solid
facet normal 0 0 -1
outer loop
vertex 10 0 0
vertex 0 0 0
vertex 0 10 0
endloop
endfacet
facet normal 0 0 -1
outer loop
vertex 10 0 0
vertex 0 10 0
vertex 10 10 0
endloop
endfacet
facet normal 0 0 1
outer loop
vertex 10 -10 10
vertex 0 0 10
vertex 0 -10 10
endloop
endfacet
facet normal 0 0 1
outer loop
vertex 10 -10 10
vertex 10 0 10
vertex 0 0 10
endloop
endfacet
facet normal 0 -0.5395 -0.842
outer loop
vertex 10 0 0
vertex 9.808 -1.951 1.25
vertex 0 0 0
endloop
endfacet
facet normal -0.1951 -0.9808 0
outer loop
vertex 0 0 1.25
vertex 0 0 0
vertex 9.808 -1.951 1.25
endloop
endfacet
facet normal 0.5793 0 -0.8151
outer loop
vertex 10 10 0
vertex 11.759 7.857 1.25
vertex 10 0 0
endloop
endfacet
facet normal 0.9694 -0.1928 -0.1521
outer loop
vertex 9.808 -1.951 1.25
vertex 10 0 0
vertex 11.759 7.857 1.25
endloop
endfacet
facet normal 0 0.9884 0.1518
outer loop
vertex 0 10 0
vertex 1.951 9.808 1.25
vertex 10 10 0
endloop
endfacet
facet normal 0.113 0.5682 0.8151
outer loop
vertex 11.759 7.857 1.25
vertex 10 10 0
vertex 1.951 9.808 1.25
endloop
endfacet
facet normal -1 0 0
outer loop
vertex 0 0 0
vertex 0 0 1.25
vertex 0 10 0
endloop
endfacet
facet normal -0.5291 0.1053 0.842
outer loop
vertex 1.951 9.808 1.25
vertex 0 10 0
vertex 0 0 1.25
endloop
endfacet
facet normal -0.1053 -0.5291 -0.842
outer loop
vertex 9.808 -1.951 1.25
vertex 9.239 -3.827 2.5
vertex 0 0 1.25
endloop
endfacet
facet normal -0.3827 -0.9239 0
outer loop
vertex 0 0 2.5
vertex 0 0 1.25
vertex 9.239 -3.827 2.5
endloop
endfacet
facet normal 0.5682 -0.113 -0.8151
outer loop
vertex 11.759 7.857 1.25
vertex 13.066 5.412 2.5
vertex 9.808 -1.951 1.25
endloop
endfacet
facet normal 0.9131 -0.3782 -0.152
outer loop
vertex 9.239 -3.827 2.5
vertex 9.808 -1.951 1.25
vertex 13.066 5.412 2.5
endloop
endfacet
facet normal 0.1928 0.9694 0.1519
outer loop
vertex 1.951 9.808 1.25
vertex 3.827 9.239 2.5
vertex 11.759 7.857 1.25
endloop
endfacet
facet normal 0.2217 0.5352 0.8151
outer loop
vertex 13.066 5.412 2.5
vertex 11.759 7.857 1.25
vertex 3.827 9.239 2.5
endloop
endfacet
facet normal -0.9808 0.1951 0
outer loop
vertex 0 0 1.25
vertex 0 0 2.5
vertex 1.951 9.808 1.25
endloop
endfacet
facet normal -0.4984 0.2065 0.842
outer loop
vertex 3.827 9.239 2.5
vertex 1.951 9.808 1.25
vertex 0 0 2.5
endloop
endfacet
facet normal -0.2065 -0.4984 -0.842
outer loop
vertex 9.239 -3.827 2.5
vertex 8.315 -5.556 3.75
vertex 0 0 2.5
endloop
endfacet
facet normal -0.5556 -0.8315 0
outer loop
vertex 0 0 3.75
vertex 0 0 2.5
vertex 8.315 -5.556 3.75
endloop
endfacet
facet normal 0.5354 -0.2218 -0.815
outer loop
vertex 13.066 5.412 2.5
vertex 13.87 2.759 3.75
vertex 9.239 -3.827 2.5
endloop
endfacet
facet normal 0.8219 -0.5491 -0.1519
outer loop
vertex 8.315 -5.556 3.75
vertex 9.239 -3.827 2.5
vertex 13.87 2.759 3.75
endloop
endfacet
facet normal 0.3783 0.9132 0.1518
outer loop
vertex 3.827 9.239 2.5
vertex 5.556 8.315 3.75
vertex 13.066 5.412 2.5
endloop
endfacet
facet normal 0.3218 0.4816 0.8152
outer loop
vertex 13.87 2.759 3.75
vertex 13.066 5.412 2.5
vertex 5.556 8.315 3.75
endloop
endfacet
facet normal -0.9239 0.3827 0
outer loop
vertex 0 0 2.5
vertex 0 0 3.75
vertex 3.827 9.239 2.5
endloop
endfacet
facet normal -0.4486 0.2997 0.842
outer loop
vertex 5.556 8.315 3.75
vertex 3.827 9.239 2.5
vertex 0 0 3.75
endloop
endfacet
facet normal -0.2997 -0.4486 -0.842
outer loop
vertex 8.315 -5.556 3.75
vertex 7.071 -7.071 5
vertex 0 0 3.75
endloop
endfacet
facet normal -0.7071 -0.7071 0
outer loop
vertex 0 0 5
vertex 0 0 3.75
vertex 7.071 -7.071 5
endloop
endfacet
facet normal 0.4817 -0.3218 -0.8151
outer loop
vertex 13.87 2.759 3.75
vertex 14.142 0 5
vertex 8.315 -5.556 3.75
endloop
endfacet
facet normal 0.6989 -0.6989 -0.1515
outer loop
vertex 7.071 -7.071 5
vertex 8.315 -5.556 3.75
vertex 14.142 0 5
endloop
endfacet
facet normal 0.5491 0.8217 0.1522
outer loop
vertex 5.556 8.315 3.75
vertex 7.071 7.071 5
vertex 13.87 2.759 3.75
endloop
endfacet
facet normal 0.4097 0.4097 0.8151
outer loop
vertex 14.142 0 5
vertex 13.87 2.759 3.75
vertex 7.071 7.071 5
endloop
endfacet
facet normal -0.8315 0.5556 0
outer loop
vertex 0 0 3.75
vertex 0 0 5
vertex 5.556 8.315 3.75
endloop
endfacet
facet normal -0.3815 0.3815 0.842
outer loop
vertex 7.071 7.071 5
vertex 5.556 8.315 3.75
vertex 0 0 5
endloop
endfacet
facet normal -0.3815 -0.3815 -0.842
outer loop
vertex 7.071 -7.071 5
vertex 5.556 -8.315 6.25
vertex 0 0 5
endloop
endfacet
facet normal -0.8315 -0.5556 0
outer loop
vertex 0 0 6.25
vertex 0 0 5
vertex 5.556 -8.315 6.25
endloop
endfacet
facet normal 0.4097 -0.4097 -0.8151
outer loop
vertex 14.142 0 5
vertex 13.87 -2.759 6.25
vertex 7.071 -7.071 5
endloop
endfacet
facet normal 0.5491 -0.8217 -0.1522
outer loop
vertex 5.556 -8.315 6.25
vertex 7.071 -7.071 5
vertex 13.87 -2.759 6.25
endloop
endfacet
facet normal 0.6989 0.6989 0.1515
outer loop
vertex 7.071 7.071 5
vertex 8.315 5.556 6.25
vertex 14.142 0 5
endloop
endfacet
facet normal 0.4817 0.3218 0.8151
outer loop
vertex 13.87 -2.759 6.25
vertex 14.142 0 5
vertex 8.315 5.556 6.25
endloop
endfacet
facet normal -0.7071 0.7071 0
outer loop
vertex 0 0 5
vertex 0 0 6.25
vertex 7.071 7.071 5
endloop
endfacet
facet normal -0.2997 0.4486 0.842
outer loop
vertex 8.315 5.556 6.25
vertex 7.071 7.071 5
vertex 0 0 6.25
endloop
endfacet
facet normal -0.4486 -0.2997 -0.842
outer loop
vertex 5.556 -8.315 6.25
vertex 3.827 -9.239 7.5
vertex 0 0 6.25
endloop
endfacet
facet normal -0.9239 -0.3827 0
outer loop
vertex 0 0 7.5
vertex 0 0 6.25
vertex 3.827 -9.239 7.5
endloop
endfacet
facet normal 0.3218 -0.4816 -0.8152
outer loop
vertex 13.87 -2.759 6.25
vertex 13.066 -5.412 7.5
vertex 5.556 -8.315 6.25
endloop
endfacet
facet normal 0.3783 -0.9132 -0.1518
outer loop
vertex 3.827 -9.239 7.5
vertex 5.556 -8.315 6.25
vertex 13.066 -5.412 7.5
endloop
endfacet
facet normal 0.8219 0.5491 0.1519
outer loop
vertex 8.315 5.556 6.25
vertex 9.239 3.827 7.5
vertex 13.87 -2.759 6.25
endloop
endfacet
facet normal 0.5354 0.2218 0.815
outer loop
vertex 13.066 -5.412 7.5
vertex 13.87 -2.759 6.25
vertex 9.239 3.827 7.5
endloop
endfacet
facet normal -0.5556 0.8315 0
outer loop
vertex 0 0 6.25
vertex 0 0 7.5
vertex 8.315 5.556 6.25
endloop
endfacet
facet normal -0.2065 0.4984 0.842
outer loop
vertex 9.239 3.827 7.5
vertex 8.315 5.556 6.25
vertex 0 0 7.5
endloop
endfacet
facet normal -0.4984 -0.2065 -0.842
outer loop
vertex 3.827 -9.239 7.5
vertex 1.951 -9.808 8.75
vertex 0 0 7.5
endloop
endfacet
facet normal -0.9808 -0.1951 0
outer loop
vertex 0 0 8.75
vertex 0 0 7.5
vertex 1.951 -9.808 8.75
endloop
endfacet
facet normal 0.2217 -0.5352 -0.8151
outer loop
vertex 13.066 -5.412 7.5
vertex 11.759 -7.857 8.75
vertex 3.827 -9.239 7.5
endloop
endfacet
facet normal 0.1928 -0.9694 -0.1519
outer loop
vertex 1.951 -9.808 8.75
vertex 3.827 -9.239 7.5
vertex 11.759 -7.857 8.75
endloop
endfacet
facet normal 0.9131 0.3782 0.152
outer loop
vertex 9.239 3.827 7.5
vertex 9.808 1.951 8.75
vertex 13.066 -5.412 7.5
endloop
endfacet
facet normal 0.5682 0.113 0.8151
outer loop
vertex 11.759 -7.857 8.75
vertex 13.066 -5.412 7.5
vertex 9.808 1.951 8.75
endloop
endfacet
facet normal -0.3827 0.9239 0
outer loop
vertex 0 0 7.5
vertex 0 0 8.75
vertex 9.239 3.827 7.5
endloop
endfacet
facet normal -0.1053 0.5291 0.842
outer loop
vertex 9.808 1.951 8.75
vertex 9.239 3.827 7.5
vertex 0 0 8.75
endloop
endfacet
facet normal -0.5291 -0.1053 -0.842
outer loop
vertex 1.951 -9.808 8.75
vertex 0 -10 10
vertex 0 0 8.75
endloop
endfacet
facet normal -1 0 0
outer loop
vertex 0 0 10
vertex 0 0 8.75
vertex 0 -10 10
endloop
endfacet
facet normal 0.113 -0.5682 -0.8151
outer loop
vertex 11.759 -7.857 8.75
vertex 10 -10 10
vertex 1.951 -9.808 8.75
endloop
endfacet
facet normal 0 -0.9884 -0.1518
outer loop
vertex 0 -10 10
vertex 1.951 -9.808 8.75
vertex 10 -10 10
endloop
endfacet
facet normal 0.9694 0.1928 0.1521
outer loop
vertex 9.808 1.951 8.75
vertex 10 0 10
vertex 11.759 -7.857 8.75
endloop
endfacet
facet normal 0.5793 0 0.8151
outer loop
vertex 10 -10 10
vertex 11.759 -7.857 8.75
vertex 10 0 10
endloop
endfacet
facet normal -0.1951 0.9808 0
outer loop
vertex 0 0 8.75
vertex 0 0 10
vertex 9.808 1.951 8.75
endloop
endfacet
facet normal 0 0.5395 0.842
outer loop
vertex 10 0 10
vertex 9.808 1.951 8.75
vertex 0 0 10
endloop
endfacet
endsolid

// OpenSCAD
// Implicit slice count for a twisted extrude: OpenSCAD derives it from the
// twist, the profile's outermost radius, and $fa/$fs — not from the twist
// alone. A fixed "twist/15" rule reads 6.8% high here.
linear_extrude(height=10, twist=90) square(10);
